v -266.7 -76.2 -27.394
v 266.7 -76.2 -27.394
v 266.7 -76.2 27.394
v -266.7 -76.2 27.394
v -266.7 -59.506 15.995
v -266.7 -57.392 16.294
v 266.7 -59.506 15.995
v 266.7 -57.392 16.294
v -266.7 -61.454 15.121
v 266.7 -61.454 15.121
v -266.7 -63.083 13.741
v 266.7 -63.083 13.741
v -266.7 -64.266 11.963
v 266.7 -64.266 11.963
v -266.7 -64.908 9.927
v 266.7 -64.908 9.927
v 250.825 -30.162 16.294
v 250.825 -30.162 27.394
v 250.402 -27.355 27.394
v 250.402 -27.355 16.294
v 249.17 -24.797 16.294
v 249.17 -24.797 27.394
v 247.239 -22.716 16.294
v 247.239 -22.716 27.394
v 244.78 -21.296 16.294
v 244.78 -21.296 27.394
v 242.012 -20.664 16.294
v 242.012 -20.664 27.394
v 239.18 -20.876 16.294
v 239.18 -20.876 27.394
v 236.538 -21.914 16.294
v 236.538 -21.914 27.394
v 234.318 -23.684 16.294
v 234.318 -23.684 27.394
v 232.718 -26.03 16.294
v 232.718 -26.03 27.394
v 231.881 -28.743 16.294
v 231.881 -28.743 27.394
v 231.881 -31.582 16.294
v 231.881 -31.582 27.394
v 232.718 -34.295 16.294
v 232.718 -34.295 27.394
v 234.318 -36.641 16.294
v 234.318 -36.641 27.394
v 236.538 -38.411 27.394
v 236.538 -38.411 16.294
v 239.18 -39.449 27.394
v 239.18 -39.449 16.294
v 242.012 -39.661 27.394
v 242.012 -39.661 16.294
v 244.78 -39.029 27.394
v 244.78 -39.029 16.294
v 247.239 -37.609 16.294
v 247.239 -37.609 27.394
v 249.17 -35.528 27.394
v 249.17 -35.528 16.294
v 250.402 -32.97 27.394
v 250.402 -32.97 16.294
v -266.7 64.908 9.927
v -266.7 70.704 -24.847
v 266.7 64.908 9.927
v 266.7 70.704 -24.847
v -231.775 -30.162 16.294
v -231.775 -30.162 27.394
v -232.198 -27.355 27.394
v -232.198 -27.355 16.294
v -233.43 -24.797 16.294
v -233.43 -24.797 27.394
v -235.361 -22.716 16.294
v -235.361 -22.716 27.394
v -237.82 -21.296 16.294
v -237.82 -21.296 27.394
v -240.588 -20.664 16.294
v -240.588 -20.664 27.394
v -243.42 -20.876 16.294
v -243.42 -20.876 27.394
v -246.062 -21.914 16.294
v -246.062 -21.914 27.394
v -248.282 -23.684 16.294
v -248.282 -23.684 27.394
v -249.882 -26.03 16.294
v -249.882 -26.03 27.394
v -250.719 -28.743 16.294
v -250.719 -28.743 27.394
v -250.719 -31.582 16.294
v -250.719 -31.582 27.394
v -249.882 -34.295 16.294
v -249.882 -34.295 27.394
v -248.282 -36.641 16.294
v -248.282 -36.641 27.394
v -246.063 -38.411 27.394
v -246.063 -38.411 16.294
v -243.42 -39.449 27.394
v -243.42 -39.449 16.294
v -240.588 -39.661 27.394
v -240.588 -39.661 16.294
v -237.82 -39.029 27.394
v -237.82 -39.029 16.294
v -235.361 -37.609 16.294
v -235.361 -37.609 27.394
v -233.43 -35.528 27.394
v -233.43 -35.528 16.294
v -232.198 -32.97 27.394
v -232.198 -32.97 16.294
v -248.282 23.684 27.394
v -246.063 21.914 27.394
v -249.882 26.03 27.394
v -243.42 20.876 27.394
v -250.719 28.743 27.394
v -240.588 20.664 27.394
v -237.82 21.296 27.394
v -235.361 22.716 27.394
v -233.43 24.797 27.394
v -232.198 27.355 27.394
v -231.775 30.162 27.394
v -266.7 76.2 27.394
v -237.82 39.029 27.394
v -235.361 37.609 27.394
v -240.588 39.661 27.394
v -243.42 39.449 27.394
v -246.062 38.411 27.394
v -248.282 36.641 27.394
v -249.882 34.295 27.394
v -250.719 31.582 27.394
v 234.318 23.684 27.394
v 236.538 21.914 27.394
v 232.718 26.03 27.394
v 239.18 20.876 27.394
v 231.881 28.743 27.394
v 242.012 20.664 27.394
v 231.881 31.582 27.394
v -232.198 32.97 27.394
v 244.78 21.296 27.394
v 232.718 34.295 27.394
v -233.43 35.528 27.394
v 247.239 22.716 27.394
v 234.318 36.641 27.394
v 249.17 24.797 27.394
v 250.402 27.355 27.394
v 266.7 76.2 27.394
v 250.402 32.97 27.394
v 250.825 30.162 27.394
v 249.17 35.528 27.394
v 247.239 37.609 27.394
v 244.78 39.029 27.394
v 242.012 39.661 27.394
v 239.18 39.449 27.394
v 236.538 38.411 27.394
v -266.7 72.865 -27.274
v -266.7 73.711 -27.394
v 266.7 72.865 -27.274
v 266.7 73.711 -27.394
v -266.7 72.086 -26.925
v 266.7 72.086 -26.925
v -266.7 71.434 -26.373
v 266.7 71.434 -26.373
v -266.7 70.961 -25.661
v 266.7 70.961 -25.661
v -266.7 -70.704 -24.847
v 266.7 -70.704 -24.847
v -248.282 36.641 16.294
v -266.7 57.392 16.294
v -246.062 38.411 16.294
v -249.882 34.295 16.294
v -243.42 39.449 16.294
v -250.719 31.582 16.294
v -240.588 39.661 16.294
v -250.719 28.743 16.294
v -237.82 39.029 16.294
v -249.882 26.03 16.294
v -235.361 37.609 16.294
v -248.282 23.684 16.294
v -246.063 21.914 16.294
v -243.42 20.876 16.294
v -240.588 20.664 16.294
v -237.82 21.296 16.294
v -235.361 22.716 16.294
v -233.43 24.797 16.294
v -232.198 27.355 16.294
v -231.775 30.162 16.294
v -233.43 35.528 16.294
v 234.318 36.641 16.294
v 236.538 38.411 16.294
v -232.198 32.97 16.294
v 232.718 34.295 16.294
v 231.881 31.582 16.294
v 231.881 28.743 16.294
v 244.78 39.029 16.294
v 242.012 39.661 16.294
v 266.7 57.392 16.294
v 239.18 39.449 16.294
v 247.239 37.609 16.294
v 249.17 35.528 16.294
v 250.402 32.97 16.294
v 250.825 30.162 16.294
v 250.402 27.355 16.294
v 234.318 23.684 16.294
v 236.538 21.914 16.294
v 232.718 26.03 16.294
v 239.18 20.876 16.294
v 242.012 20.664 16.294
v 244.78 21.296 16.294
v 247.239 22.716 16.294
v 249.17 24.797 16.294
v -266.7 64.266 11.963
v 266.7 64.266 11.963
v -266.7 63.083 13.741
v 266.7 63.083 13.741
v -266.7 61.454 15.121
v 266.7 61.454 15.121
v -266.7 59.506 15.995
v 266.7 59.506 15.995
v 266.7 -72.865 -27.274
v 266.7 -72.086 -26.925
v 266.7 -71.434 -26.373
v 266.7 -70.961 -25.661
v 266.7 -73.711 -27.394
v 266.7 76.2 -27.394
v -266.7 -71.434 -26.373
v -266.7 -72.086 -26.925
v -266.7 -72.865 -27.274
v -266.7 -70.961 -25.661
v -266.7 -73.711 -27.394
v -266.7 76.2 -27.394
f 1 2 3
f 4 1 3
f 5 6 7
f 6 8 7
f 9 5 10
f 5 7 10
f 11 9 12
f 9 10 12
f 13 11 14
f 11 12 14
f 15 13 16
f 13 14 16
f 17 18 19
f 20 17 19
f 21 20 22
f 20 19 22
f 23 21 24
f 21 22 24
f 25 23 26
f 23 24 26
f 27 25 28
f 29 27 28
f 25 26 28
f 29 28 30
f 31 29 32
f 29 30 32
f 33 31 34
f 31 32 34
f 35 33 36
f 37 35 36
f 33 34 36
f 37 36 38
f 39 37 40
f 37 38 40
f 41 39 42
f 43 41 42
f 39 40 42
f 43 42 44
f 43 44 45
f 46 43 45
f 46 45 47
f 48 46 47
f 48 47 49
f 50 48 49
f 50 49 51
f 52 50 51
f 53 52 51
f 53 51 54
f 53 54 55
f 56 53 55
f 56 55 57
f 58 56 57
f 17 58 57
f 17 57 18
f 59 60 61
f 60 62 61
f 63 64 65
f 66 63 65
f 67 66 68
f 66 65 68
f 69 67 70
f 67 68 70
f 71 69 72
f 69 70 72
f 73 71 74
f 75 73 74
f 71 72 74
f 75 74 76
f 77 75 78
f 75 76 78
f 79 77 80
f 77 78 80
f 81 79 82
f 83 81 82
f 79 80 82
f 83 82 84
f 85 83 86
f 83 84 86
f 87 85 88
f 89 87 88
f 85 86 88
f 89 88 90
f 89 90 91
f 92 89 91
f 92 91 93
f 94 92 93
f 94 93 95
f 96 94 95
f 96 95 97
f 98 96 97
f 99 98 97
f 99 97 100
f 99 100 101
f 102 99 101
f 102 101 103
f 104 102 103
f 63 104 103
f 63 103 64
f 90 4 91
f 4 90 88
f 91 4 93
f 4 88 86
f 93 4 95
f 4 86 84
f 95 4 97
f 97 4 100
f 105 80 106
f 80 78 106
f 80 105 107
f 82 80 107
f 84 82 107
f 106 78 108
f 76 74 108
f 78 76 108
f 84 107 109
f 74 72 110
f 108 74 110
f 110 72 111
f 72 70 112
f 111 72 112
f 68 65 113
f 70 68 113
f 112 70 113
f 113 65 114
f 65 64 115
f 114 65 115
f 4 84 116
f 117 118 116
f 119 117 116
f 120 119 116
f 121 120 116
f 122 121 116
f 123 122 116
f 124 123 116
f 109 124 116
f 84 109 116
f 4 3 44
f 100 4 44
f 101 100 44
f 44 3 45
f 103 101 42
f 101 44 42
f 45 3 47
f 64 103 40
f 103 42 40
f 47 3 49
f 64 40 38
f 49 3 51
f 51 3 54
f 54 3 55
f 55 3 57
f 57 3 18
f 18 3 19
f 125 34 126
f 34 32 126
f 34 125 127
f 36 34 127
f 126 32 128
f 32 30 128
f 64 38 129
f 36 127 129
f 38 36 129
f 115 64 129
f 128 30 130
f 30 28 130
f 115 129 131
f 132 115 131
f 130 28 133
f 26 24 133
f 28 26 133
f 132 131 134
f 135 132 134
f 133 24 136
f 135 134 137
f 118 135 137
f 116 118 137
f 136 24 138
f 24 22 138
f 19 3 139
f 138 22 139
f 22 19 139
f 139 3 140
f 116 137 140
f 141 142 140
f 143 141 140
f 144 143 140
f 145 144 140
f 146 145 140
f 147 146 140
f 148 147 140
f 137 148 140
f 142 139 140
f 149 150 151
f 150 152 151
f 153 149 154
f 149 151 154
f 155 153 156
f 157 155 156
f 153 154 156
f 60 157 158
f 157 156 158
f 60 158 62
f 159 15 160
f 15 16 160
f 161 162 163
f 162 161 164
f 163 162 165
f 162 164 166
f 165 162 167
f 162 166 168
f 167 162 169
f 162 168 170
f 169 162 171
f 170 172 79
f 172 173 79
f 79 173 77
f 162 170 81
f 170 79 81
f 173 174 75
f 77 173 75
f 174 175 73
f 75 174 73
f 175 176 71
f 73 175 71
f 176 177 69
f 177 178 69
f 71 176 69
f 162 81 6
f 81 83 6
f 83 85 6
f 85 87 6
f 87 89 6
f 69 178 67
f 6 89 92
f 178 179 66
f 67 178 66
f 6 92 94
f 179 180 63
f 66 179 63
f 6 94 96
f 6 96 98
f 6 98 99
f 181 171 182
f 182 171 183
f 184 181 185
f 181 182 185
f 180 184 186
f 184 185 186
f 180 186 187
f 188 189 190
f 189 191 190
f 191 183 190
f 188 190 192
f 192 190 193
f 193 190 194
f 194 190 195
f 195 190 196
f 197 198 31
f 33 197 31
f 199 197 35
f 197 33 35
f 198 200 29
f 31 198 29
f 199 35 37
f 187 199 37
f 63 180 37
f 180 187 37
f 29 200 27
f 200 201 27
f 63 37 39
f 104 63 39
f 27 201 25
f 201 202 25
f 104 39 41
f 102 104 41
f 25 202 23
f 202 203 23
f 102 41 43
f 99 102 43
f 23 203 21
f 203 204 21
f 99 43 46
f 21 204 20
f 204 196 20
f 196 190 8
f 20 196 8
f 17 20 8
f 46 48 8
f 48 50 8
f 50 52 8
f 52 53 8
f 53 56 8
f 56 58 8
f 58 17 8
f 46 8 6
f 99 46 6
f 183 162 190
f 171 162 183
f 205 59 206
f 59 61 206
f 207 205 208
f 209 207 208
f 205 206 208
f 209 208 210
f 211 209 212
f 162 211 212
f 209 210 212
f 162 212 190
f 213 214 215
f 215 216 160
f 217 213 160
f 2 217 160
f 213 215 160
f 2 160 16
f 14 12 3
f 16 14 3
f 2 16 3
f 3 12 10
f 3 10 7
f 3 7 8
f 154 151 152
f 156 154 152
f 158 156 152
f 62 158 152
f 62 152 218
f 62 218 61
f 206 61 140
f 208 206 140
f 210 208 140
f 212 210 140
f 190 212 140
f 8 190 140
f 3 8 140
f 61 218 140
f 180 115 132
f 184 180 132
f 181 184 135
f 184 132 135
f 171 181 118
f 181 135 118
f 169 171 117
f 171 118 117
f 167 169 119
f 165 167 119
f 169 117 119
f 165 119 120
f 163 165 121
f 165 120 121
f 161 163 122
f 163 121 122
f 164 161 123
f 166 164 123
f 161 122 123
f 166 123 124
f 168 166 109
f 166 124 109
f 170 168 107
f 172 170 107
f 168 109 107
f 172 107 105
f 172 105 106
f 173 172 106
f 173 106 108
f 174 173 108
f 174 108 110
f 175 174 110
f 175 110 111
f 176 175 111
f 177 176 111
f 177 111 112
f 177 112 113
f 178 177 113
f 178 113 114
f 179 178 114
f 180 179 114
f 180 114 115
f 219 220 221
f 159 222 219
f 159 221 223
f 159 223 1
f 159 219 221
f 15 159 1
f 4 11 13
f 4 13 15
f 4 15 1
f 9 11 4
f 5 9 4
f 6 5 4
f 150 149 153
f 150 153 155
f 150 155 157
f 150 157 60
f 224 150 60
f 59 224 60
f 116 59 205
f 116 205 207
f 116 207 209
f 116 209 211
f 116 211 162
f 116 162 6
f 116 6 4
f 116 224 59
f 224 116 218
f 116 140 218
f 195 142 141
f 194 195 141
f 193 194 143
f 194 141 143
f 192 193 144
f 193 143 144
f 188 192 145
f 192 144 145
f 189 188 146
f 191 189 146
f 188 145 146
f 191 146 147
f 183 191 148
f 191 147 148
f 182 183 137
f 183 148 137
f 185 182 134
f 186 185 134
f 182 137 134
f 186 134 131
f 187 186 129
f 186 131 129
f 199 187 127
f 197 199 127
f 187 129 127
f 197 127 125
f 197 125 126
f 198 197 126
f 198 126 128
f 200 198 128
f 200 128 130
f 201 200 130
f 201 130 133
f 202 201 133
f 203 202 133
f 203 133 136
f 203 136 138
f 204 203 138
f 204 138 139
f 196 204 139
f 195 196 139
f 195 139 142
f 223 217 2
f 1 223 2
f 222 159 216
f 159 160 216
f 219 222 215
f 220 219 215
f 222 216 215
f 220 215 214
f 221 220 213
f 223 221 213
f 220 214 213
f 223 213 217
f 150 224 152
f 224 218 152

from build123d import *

# Parameters (mm, degrees)
BOSS_EXTRUDE1_DEPTH = 266.7
CUT_EXTRUDE1_REACH  = 56.788
SKETCH2_R           = 9.525


with BuildPart() as part:
    # Sketch1 → Boss-Extrude1 (new body, symmetric)
    with BuildSketch(Plane(origin=(0, 0, 0), x_dir=(0, 0, -1), z_dir=(1, 0, 0))):
        with BuildLine():
            Line((-27.3939, -76.2), (-27.3939, 76.2))
            Line((-27.3939, 76.2), (27.3939, 76.2))
            Line((27.3939, 76.2), (27.3939, 73.710744653))
            ThreePointArc((27.3939, 73.710744653), (26.67159656, 71.740607726), (24.84702368, 70.704221901))
            Line((24.84702368, 70.704221901), (-9.926909199, 64.908143628))
            ThreePointArc((-9.926909199, 64.908143628), (-14.488341399, 62.317179067), (-16.2941, 57.391836749))
            Line((-16.2941, 57.391836749), (-16.2941, -57.391836749))
            ThreePointArc((-16.2941, -57.391836749), (-14.488341399, -62.317179067), (-9.926909199, -64.908143628))
            Line((-9.926909199, -64.908143628), (24.84702368, -70.704221901))
            ThreePointArc((24.84702368, -70.704221901), (26.67159656, -71.740607726), (27.3939, -73.710744653))
            Line((27.3939, -73.710744653), (27.3939, -76.2))
            Line((27.3939, -76.2), (-27.3939, -76.2))
        make_face()
    extrude(amount=BOSS_EXTRUDE1_DEPTH, both=True)

    # Sketch2 → Cut-Extrude1 (cut, up to next)
    with BuildSketch(Plane.XY.offset(27.3939), mode=Mode.PRIVATE) as cut_extrude1_sk1:
        with Locations((-241.3, 30.1625)):
            Circle(SKETCH2_R)
    cut_extrude1_tool1 = extrude(cut_extrude1_sk1.sketch, amount=-CUT_EXTRUDE1_REACH, mode=Mode.PRIVATE) & part.part
    add(cut_extrude1_tool1.solids().sort_by_distance((-241.3, 30.1625, 27.3939))[0], mode=Mode.SUBTRACT)
    # Sketch2 → Cut-Extrude1 (cut, up to next)
    with BuildSketch(Plane.XY.offset(27.3939), mode=Mode.PRIVATE) as cut_extrude1_sk2:
        with Locations((-241.3, -30.1625)):
            Circle(SKETCH2_R)
    cut_extrude1_tool2 = extrude(cut_extrude1_sk2.sketch, amount=-CUT_EXTRUDE1_REACH, mode=Mode.PRIVATE) & part.part
    add(cut_extrude1_tool2.solids().sort_by_distance((-241.3, -30.1625, 27.3939))[0], mode=Mode.SUBTRACT)
    # Sketch2 → Cut-Extrude1 (cut, up to next)
    with BuildSketch(Plane.XY.offset(27.3939), mode=Mode.PRIVATE) as cut_extrude1_sk3:
        with Locations((241.3, -30.1625)):
            Circle(SKETCH2_R)
    cut_extrude1_tool3 = extrude(cut_extrude1_sk3.sketch, amount=-CUT_EXTRUDE1_REACH, mode=Mode.PRIVATE) & part.part
    add(cut_extrude1_tool3.solids().sort_by_distance((241.3, -30.1625, 27.3939))[0], mode=Mode.SUBTRACT)
    # Sketch2 → Cut-Extrude1 (cut, up to next)
    with BuildSketch(Plane.XY.offset(27.3939), mode=Mode.PRIVATE) as cut_extrude1_sk4:
        with Locations((241.3, 30.1625)):
            Circle(SKETCH2_R)
    cut_extrude1_tool4 = extrude(cut_extrude1_sk4.sketch, amount=-CUT_EXTRUDE1_REACH, mode=Mode.PRIVATE) & part.part
    add(cut_extrude1_tool4.solids().sort_by_distance((241.3, 30.1625, 27.3939))[0], mode=Mode.SUBTRACT)


solid = part.part
